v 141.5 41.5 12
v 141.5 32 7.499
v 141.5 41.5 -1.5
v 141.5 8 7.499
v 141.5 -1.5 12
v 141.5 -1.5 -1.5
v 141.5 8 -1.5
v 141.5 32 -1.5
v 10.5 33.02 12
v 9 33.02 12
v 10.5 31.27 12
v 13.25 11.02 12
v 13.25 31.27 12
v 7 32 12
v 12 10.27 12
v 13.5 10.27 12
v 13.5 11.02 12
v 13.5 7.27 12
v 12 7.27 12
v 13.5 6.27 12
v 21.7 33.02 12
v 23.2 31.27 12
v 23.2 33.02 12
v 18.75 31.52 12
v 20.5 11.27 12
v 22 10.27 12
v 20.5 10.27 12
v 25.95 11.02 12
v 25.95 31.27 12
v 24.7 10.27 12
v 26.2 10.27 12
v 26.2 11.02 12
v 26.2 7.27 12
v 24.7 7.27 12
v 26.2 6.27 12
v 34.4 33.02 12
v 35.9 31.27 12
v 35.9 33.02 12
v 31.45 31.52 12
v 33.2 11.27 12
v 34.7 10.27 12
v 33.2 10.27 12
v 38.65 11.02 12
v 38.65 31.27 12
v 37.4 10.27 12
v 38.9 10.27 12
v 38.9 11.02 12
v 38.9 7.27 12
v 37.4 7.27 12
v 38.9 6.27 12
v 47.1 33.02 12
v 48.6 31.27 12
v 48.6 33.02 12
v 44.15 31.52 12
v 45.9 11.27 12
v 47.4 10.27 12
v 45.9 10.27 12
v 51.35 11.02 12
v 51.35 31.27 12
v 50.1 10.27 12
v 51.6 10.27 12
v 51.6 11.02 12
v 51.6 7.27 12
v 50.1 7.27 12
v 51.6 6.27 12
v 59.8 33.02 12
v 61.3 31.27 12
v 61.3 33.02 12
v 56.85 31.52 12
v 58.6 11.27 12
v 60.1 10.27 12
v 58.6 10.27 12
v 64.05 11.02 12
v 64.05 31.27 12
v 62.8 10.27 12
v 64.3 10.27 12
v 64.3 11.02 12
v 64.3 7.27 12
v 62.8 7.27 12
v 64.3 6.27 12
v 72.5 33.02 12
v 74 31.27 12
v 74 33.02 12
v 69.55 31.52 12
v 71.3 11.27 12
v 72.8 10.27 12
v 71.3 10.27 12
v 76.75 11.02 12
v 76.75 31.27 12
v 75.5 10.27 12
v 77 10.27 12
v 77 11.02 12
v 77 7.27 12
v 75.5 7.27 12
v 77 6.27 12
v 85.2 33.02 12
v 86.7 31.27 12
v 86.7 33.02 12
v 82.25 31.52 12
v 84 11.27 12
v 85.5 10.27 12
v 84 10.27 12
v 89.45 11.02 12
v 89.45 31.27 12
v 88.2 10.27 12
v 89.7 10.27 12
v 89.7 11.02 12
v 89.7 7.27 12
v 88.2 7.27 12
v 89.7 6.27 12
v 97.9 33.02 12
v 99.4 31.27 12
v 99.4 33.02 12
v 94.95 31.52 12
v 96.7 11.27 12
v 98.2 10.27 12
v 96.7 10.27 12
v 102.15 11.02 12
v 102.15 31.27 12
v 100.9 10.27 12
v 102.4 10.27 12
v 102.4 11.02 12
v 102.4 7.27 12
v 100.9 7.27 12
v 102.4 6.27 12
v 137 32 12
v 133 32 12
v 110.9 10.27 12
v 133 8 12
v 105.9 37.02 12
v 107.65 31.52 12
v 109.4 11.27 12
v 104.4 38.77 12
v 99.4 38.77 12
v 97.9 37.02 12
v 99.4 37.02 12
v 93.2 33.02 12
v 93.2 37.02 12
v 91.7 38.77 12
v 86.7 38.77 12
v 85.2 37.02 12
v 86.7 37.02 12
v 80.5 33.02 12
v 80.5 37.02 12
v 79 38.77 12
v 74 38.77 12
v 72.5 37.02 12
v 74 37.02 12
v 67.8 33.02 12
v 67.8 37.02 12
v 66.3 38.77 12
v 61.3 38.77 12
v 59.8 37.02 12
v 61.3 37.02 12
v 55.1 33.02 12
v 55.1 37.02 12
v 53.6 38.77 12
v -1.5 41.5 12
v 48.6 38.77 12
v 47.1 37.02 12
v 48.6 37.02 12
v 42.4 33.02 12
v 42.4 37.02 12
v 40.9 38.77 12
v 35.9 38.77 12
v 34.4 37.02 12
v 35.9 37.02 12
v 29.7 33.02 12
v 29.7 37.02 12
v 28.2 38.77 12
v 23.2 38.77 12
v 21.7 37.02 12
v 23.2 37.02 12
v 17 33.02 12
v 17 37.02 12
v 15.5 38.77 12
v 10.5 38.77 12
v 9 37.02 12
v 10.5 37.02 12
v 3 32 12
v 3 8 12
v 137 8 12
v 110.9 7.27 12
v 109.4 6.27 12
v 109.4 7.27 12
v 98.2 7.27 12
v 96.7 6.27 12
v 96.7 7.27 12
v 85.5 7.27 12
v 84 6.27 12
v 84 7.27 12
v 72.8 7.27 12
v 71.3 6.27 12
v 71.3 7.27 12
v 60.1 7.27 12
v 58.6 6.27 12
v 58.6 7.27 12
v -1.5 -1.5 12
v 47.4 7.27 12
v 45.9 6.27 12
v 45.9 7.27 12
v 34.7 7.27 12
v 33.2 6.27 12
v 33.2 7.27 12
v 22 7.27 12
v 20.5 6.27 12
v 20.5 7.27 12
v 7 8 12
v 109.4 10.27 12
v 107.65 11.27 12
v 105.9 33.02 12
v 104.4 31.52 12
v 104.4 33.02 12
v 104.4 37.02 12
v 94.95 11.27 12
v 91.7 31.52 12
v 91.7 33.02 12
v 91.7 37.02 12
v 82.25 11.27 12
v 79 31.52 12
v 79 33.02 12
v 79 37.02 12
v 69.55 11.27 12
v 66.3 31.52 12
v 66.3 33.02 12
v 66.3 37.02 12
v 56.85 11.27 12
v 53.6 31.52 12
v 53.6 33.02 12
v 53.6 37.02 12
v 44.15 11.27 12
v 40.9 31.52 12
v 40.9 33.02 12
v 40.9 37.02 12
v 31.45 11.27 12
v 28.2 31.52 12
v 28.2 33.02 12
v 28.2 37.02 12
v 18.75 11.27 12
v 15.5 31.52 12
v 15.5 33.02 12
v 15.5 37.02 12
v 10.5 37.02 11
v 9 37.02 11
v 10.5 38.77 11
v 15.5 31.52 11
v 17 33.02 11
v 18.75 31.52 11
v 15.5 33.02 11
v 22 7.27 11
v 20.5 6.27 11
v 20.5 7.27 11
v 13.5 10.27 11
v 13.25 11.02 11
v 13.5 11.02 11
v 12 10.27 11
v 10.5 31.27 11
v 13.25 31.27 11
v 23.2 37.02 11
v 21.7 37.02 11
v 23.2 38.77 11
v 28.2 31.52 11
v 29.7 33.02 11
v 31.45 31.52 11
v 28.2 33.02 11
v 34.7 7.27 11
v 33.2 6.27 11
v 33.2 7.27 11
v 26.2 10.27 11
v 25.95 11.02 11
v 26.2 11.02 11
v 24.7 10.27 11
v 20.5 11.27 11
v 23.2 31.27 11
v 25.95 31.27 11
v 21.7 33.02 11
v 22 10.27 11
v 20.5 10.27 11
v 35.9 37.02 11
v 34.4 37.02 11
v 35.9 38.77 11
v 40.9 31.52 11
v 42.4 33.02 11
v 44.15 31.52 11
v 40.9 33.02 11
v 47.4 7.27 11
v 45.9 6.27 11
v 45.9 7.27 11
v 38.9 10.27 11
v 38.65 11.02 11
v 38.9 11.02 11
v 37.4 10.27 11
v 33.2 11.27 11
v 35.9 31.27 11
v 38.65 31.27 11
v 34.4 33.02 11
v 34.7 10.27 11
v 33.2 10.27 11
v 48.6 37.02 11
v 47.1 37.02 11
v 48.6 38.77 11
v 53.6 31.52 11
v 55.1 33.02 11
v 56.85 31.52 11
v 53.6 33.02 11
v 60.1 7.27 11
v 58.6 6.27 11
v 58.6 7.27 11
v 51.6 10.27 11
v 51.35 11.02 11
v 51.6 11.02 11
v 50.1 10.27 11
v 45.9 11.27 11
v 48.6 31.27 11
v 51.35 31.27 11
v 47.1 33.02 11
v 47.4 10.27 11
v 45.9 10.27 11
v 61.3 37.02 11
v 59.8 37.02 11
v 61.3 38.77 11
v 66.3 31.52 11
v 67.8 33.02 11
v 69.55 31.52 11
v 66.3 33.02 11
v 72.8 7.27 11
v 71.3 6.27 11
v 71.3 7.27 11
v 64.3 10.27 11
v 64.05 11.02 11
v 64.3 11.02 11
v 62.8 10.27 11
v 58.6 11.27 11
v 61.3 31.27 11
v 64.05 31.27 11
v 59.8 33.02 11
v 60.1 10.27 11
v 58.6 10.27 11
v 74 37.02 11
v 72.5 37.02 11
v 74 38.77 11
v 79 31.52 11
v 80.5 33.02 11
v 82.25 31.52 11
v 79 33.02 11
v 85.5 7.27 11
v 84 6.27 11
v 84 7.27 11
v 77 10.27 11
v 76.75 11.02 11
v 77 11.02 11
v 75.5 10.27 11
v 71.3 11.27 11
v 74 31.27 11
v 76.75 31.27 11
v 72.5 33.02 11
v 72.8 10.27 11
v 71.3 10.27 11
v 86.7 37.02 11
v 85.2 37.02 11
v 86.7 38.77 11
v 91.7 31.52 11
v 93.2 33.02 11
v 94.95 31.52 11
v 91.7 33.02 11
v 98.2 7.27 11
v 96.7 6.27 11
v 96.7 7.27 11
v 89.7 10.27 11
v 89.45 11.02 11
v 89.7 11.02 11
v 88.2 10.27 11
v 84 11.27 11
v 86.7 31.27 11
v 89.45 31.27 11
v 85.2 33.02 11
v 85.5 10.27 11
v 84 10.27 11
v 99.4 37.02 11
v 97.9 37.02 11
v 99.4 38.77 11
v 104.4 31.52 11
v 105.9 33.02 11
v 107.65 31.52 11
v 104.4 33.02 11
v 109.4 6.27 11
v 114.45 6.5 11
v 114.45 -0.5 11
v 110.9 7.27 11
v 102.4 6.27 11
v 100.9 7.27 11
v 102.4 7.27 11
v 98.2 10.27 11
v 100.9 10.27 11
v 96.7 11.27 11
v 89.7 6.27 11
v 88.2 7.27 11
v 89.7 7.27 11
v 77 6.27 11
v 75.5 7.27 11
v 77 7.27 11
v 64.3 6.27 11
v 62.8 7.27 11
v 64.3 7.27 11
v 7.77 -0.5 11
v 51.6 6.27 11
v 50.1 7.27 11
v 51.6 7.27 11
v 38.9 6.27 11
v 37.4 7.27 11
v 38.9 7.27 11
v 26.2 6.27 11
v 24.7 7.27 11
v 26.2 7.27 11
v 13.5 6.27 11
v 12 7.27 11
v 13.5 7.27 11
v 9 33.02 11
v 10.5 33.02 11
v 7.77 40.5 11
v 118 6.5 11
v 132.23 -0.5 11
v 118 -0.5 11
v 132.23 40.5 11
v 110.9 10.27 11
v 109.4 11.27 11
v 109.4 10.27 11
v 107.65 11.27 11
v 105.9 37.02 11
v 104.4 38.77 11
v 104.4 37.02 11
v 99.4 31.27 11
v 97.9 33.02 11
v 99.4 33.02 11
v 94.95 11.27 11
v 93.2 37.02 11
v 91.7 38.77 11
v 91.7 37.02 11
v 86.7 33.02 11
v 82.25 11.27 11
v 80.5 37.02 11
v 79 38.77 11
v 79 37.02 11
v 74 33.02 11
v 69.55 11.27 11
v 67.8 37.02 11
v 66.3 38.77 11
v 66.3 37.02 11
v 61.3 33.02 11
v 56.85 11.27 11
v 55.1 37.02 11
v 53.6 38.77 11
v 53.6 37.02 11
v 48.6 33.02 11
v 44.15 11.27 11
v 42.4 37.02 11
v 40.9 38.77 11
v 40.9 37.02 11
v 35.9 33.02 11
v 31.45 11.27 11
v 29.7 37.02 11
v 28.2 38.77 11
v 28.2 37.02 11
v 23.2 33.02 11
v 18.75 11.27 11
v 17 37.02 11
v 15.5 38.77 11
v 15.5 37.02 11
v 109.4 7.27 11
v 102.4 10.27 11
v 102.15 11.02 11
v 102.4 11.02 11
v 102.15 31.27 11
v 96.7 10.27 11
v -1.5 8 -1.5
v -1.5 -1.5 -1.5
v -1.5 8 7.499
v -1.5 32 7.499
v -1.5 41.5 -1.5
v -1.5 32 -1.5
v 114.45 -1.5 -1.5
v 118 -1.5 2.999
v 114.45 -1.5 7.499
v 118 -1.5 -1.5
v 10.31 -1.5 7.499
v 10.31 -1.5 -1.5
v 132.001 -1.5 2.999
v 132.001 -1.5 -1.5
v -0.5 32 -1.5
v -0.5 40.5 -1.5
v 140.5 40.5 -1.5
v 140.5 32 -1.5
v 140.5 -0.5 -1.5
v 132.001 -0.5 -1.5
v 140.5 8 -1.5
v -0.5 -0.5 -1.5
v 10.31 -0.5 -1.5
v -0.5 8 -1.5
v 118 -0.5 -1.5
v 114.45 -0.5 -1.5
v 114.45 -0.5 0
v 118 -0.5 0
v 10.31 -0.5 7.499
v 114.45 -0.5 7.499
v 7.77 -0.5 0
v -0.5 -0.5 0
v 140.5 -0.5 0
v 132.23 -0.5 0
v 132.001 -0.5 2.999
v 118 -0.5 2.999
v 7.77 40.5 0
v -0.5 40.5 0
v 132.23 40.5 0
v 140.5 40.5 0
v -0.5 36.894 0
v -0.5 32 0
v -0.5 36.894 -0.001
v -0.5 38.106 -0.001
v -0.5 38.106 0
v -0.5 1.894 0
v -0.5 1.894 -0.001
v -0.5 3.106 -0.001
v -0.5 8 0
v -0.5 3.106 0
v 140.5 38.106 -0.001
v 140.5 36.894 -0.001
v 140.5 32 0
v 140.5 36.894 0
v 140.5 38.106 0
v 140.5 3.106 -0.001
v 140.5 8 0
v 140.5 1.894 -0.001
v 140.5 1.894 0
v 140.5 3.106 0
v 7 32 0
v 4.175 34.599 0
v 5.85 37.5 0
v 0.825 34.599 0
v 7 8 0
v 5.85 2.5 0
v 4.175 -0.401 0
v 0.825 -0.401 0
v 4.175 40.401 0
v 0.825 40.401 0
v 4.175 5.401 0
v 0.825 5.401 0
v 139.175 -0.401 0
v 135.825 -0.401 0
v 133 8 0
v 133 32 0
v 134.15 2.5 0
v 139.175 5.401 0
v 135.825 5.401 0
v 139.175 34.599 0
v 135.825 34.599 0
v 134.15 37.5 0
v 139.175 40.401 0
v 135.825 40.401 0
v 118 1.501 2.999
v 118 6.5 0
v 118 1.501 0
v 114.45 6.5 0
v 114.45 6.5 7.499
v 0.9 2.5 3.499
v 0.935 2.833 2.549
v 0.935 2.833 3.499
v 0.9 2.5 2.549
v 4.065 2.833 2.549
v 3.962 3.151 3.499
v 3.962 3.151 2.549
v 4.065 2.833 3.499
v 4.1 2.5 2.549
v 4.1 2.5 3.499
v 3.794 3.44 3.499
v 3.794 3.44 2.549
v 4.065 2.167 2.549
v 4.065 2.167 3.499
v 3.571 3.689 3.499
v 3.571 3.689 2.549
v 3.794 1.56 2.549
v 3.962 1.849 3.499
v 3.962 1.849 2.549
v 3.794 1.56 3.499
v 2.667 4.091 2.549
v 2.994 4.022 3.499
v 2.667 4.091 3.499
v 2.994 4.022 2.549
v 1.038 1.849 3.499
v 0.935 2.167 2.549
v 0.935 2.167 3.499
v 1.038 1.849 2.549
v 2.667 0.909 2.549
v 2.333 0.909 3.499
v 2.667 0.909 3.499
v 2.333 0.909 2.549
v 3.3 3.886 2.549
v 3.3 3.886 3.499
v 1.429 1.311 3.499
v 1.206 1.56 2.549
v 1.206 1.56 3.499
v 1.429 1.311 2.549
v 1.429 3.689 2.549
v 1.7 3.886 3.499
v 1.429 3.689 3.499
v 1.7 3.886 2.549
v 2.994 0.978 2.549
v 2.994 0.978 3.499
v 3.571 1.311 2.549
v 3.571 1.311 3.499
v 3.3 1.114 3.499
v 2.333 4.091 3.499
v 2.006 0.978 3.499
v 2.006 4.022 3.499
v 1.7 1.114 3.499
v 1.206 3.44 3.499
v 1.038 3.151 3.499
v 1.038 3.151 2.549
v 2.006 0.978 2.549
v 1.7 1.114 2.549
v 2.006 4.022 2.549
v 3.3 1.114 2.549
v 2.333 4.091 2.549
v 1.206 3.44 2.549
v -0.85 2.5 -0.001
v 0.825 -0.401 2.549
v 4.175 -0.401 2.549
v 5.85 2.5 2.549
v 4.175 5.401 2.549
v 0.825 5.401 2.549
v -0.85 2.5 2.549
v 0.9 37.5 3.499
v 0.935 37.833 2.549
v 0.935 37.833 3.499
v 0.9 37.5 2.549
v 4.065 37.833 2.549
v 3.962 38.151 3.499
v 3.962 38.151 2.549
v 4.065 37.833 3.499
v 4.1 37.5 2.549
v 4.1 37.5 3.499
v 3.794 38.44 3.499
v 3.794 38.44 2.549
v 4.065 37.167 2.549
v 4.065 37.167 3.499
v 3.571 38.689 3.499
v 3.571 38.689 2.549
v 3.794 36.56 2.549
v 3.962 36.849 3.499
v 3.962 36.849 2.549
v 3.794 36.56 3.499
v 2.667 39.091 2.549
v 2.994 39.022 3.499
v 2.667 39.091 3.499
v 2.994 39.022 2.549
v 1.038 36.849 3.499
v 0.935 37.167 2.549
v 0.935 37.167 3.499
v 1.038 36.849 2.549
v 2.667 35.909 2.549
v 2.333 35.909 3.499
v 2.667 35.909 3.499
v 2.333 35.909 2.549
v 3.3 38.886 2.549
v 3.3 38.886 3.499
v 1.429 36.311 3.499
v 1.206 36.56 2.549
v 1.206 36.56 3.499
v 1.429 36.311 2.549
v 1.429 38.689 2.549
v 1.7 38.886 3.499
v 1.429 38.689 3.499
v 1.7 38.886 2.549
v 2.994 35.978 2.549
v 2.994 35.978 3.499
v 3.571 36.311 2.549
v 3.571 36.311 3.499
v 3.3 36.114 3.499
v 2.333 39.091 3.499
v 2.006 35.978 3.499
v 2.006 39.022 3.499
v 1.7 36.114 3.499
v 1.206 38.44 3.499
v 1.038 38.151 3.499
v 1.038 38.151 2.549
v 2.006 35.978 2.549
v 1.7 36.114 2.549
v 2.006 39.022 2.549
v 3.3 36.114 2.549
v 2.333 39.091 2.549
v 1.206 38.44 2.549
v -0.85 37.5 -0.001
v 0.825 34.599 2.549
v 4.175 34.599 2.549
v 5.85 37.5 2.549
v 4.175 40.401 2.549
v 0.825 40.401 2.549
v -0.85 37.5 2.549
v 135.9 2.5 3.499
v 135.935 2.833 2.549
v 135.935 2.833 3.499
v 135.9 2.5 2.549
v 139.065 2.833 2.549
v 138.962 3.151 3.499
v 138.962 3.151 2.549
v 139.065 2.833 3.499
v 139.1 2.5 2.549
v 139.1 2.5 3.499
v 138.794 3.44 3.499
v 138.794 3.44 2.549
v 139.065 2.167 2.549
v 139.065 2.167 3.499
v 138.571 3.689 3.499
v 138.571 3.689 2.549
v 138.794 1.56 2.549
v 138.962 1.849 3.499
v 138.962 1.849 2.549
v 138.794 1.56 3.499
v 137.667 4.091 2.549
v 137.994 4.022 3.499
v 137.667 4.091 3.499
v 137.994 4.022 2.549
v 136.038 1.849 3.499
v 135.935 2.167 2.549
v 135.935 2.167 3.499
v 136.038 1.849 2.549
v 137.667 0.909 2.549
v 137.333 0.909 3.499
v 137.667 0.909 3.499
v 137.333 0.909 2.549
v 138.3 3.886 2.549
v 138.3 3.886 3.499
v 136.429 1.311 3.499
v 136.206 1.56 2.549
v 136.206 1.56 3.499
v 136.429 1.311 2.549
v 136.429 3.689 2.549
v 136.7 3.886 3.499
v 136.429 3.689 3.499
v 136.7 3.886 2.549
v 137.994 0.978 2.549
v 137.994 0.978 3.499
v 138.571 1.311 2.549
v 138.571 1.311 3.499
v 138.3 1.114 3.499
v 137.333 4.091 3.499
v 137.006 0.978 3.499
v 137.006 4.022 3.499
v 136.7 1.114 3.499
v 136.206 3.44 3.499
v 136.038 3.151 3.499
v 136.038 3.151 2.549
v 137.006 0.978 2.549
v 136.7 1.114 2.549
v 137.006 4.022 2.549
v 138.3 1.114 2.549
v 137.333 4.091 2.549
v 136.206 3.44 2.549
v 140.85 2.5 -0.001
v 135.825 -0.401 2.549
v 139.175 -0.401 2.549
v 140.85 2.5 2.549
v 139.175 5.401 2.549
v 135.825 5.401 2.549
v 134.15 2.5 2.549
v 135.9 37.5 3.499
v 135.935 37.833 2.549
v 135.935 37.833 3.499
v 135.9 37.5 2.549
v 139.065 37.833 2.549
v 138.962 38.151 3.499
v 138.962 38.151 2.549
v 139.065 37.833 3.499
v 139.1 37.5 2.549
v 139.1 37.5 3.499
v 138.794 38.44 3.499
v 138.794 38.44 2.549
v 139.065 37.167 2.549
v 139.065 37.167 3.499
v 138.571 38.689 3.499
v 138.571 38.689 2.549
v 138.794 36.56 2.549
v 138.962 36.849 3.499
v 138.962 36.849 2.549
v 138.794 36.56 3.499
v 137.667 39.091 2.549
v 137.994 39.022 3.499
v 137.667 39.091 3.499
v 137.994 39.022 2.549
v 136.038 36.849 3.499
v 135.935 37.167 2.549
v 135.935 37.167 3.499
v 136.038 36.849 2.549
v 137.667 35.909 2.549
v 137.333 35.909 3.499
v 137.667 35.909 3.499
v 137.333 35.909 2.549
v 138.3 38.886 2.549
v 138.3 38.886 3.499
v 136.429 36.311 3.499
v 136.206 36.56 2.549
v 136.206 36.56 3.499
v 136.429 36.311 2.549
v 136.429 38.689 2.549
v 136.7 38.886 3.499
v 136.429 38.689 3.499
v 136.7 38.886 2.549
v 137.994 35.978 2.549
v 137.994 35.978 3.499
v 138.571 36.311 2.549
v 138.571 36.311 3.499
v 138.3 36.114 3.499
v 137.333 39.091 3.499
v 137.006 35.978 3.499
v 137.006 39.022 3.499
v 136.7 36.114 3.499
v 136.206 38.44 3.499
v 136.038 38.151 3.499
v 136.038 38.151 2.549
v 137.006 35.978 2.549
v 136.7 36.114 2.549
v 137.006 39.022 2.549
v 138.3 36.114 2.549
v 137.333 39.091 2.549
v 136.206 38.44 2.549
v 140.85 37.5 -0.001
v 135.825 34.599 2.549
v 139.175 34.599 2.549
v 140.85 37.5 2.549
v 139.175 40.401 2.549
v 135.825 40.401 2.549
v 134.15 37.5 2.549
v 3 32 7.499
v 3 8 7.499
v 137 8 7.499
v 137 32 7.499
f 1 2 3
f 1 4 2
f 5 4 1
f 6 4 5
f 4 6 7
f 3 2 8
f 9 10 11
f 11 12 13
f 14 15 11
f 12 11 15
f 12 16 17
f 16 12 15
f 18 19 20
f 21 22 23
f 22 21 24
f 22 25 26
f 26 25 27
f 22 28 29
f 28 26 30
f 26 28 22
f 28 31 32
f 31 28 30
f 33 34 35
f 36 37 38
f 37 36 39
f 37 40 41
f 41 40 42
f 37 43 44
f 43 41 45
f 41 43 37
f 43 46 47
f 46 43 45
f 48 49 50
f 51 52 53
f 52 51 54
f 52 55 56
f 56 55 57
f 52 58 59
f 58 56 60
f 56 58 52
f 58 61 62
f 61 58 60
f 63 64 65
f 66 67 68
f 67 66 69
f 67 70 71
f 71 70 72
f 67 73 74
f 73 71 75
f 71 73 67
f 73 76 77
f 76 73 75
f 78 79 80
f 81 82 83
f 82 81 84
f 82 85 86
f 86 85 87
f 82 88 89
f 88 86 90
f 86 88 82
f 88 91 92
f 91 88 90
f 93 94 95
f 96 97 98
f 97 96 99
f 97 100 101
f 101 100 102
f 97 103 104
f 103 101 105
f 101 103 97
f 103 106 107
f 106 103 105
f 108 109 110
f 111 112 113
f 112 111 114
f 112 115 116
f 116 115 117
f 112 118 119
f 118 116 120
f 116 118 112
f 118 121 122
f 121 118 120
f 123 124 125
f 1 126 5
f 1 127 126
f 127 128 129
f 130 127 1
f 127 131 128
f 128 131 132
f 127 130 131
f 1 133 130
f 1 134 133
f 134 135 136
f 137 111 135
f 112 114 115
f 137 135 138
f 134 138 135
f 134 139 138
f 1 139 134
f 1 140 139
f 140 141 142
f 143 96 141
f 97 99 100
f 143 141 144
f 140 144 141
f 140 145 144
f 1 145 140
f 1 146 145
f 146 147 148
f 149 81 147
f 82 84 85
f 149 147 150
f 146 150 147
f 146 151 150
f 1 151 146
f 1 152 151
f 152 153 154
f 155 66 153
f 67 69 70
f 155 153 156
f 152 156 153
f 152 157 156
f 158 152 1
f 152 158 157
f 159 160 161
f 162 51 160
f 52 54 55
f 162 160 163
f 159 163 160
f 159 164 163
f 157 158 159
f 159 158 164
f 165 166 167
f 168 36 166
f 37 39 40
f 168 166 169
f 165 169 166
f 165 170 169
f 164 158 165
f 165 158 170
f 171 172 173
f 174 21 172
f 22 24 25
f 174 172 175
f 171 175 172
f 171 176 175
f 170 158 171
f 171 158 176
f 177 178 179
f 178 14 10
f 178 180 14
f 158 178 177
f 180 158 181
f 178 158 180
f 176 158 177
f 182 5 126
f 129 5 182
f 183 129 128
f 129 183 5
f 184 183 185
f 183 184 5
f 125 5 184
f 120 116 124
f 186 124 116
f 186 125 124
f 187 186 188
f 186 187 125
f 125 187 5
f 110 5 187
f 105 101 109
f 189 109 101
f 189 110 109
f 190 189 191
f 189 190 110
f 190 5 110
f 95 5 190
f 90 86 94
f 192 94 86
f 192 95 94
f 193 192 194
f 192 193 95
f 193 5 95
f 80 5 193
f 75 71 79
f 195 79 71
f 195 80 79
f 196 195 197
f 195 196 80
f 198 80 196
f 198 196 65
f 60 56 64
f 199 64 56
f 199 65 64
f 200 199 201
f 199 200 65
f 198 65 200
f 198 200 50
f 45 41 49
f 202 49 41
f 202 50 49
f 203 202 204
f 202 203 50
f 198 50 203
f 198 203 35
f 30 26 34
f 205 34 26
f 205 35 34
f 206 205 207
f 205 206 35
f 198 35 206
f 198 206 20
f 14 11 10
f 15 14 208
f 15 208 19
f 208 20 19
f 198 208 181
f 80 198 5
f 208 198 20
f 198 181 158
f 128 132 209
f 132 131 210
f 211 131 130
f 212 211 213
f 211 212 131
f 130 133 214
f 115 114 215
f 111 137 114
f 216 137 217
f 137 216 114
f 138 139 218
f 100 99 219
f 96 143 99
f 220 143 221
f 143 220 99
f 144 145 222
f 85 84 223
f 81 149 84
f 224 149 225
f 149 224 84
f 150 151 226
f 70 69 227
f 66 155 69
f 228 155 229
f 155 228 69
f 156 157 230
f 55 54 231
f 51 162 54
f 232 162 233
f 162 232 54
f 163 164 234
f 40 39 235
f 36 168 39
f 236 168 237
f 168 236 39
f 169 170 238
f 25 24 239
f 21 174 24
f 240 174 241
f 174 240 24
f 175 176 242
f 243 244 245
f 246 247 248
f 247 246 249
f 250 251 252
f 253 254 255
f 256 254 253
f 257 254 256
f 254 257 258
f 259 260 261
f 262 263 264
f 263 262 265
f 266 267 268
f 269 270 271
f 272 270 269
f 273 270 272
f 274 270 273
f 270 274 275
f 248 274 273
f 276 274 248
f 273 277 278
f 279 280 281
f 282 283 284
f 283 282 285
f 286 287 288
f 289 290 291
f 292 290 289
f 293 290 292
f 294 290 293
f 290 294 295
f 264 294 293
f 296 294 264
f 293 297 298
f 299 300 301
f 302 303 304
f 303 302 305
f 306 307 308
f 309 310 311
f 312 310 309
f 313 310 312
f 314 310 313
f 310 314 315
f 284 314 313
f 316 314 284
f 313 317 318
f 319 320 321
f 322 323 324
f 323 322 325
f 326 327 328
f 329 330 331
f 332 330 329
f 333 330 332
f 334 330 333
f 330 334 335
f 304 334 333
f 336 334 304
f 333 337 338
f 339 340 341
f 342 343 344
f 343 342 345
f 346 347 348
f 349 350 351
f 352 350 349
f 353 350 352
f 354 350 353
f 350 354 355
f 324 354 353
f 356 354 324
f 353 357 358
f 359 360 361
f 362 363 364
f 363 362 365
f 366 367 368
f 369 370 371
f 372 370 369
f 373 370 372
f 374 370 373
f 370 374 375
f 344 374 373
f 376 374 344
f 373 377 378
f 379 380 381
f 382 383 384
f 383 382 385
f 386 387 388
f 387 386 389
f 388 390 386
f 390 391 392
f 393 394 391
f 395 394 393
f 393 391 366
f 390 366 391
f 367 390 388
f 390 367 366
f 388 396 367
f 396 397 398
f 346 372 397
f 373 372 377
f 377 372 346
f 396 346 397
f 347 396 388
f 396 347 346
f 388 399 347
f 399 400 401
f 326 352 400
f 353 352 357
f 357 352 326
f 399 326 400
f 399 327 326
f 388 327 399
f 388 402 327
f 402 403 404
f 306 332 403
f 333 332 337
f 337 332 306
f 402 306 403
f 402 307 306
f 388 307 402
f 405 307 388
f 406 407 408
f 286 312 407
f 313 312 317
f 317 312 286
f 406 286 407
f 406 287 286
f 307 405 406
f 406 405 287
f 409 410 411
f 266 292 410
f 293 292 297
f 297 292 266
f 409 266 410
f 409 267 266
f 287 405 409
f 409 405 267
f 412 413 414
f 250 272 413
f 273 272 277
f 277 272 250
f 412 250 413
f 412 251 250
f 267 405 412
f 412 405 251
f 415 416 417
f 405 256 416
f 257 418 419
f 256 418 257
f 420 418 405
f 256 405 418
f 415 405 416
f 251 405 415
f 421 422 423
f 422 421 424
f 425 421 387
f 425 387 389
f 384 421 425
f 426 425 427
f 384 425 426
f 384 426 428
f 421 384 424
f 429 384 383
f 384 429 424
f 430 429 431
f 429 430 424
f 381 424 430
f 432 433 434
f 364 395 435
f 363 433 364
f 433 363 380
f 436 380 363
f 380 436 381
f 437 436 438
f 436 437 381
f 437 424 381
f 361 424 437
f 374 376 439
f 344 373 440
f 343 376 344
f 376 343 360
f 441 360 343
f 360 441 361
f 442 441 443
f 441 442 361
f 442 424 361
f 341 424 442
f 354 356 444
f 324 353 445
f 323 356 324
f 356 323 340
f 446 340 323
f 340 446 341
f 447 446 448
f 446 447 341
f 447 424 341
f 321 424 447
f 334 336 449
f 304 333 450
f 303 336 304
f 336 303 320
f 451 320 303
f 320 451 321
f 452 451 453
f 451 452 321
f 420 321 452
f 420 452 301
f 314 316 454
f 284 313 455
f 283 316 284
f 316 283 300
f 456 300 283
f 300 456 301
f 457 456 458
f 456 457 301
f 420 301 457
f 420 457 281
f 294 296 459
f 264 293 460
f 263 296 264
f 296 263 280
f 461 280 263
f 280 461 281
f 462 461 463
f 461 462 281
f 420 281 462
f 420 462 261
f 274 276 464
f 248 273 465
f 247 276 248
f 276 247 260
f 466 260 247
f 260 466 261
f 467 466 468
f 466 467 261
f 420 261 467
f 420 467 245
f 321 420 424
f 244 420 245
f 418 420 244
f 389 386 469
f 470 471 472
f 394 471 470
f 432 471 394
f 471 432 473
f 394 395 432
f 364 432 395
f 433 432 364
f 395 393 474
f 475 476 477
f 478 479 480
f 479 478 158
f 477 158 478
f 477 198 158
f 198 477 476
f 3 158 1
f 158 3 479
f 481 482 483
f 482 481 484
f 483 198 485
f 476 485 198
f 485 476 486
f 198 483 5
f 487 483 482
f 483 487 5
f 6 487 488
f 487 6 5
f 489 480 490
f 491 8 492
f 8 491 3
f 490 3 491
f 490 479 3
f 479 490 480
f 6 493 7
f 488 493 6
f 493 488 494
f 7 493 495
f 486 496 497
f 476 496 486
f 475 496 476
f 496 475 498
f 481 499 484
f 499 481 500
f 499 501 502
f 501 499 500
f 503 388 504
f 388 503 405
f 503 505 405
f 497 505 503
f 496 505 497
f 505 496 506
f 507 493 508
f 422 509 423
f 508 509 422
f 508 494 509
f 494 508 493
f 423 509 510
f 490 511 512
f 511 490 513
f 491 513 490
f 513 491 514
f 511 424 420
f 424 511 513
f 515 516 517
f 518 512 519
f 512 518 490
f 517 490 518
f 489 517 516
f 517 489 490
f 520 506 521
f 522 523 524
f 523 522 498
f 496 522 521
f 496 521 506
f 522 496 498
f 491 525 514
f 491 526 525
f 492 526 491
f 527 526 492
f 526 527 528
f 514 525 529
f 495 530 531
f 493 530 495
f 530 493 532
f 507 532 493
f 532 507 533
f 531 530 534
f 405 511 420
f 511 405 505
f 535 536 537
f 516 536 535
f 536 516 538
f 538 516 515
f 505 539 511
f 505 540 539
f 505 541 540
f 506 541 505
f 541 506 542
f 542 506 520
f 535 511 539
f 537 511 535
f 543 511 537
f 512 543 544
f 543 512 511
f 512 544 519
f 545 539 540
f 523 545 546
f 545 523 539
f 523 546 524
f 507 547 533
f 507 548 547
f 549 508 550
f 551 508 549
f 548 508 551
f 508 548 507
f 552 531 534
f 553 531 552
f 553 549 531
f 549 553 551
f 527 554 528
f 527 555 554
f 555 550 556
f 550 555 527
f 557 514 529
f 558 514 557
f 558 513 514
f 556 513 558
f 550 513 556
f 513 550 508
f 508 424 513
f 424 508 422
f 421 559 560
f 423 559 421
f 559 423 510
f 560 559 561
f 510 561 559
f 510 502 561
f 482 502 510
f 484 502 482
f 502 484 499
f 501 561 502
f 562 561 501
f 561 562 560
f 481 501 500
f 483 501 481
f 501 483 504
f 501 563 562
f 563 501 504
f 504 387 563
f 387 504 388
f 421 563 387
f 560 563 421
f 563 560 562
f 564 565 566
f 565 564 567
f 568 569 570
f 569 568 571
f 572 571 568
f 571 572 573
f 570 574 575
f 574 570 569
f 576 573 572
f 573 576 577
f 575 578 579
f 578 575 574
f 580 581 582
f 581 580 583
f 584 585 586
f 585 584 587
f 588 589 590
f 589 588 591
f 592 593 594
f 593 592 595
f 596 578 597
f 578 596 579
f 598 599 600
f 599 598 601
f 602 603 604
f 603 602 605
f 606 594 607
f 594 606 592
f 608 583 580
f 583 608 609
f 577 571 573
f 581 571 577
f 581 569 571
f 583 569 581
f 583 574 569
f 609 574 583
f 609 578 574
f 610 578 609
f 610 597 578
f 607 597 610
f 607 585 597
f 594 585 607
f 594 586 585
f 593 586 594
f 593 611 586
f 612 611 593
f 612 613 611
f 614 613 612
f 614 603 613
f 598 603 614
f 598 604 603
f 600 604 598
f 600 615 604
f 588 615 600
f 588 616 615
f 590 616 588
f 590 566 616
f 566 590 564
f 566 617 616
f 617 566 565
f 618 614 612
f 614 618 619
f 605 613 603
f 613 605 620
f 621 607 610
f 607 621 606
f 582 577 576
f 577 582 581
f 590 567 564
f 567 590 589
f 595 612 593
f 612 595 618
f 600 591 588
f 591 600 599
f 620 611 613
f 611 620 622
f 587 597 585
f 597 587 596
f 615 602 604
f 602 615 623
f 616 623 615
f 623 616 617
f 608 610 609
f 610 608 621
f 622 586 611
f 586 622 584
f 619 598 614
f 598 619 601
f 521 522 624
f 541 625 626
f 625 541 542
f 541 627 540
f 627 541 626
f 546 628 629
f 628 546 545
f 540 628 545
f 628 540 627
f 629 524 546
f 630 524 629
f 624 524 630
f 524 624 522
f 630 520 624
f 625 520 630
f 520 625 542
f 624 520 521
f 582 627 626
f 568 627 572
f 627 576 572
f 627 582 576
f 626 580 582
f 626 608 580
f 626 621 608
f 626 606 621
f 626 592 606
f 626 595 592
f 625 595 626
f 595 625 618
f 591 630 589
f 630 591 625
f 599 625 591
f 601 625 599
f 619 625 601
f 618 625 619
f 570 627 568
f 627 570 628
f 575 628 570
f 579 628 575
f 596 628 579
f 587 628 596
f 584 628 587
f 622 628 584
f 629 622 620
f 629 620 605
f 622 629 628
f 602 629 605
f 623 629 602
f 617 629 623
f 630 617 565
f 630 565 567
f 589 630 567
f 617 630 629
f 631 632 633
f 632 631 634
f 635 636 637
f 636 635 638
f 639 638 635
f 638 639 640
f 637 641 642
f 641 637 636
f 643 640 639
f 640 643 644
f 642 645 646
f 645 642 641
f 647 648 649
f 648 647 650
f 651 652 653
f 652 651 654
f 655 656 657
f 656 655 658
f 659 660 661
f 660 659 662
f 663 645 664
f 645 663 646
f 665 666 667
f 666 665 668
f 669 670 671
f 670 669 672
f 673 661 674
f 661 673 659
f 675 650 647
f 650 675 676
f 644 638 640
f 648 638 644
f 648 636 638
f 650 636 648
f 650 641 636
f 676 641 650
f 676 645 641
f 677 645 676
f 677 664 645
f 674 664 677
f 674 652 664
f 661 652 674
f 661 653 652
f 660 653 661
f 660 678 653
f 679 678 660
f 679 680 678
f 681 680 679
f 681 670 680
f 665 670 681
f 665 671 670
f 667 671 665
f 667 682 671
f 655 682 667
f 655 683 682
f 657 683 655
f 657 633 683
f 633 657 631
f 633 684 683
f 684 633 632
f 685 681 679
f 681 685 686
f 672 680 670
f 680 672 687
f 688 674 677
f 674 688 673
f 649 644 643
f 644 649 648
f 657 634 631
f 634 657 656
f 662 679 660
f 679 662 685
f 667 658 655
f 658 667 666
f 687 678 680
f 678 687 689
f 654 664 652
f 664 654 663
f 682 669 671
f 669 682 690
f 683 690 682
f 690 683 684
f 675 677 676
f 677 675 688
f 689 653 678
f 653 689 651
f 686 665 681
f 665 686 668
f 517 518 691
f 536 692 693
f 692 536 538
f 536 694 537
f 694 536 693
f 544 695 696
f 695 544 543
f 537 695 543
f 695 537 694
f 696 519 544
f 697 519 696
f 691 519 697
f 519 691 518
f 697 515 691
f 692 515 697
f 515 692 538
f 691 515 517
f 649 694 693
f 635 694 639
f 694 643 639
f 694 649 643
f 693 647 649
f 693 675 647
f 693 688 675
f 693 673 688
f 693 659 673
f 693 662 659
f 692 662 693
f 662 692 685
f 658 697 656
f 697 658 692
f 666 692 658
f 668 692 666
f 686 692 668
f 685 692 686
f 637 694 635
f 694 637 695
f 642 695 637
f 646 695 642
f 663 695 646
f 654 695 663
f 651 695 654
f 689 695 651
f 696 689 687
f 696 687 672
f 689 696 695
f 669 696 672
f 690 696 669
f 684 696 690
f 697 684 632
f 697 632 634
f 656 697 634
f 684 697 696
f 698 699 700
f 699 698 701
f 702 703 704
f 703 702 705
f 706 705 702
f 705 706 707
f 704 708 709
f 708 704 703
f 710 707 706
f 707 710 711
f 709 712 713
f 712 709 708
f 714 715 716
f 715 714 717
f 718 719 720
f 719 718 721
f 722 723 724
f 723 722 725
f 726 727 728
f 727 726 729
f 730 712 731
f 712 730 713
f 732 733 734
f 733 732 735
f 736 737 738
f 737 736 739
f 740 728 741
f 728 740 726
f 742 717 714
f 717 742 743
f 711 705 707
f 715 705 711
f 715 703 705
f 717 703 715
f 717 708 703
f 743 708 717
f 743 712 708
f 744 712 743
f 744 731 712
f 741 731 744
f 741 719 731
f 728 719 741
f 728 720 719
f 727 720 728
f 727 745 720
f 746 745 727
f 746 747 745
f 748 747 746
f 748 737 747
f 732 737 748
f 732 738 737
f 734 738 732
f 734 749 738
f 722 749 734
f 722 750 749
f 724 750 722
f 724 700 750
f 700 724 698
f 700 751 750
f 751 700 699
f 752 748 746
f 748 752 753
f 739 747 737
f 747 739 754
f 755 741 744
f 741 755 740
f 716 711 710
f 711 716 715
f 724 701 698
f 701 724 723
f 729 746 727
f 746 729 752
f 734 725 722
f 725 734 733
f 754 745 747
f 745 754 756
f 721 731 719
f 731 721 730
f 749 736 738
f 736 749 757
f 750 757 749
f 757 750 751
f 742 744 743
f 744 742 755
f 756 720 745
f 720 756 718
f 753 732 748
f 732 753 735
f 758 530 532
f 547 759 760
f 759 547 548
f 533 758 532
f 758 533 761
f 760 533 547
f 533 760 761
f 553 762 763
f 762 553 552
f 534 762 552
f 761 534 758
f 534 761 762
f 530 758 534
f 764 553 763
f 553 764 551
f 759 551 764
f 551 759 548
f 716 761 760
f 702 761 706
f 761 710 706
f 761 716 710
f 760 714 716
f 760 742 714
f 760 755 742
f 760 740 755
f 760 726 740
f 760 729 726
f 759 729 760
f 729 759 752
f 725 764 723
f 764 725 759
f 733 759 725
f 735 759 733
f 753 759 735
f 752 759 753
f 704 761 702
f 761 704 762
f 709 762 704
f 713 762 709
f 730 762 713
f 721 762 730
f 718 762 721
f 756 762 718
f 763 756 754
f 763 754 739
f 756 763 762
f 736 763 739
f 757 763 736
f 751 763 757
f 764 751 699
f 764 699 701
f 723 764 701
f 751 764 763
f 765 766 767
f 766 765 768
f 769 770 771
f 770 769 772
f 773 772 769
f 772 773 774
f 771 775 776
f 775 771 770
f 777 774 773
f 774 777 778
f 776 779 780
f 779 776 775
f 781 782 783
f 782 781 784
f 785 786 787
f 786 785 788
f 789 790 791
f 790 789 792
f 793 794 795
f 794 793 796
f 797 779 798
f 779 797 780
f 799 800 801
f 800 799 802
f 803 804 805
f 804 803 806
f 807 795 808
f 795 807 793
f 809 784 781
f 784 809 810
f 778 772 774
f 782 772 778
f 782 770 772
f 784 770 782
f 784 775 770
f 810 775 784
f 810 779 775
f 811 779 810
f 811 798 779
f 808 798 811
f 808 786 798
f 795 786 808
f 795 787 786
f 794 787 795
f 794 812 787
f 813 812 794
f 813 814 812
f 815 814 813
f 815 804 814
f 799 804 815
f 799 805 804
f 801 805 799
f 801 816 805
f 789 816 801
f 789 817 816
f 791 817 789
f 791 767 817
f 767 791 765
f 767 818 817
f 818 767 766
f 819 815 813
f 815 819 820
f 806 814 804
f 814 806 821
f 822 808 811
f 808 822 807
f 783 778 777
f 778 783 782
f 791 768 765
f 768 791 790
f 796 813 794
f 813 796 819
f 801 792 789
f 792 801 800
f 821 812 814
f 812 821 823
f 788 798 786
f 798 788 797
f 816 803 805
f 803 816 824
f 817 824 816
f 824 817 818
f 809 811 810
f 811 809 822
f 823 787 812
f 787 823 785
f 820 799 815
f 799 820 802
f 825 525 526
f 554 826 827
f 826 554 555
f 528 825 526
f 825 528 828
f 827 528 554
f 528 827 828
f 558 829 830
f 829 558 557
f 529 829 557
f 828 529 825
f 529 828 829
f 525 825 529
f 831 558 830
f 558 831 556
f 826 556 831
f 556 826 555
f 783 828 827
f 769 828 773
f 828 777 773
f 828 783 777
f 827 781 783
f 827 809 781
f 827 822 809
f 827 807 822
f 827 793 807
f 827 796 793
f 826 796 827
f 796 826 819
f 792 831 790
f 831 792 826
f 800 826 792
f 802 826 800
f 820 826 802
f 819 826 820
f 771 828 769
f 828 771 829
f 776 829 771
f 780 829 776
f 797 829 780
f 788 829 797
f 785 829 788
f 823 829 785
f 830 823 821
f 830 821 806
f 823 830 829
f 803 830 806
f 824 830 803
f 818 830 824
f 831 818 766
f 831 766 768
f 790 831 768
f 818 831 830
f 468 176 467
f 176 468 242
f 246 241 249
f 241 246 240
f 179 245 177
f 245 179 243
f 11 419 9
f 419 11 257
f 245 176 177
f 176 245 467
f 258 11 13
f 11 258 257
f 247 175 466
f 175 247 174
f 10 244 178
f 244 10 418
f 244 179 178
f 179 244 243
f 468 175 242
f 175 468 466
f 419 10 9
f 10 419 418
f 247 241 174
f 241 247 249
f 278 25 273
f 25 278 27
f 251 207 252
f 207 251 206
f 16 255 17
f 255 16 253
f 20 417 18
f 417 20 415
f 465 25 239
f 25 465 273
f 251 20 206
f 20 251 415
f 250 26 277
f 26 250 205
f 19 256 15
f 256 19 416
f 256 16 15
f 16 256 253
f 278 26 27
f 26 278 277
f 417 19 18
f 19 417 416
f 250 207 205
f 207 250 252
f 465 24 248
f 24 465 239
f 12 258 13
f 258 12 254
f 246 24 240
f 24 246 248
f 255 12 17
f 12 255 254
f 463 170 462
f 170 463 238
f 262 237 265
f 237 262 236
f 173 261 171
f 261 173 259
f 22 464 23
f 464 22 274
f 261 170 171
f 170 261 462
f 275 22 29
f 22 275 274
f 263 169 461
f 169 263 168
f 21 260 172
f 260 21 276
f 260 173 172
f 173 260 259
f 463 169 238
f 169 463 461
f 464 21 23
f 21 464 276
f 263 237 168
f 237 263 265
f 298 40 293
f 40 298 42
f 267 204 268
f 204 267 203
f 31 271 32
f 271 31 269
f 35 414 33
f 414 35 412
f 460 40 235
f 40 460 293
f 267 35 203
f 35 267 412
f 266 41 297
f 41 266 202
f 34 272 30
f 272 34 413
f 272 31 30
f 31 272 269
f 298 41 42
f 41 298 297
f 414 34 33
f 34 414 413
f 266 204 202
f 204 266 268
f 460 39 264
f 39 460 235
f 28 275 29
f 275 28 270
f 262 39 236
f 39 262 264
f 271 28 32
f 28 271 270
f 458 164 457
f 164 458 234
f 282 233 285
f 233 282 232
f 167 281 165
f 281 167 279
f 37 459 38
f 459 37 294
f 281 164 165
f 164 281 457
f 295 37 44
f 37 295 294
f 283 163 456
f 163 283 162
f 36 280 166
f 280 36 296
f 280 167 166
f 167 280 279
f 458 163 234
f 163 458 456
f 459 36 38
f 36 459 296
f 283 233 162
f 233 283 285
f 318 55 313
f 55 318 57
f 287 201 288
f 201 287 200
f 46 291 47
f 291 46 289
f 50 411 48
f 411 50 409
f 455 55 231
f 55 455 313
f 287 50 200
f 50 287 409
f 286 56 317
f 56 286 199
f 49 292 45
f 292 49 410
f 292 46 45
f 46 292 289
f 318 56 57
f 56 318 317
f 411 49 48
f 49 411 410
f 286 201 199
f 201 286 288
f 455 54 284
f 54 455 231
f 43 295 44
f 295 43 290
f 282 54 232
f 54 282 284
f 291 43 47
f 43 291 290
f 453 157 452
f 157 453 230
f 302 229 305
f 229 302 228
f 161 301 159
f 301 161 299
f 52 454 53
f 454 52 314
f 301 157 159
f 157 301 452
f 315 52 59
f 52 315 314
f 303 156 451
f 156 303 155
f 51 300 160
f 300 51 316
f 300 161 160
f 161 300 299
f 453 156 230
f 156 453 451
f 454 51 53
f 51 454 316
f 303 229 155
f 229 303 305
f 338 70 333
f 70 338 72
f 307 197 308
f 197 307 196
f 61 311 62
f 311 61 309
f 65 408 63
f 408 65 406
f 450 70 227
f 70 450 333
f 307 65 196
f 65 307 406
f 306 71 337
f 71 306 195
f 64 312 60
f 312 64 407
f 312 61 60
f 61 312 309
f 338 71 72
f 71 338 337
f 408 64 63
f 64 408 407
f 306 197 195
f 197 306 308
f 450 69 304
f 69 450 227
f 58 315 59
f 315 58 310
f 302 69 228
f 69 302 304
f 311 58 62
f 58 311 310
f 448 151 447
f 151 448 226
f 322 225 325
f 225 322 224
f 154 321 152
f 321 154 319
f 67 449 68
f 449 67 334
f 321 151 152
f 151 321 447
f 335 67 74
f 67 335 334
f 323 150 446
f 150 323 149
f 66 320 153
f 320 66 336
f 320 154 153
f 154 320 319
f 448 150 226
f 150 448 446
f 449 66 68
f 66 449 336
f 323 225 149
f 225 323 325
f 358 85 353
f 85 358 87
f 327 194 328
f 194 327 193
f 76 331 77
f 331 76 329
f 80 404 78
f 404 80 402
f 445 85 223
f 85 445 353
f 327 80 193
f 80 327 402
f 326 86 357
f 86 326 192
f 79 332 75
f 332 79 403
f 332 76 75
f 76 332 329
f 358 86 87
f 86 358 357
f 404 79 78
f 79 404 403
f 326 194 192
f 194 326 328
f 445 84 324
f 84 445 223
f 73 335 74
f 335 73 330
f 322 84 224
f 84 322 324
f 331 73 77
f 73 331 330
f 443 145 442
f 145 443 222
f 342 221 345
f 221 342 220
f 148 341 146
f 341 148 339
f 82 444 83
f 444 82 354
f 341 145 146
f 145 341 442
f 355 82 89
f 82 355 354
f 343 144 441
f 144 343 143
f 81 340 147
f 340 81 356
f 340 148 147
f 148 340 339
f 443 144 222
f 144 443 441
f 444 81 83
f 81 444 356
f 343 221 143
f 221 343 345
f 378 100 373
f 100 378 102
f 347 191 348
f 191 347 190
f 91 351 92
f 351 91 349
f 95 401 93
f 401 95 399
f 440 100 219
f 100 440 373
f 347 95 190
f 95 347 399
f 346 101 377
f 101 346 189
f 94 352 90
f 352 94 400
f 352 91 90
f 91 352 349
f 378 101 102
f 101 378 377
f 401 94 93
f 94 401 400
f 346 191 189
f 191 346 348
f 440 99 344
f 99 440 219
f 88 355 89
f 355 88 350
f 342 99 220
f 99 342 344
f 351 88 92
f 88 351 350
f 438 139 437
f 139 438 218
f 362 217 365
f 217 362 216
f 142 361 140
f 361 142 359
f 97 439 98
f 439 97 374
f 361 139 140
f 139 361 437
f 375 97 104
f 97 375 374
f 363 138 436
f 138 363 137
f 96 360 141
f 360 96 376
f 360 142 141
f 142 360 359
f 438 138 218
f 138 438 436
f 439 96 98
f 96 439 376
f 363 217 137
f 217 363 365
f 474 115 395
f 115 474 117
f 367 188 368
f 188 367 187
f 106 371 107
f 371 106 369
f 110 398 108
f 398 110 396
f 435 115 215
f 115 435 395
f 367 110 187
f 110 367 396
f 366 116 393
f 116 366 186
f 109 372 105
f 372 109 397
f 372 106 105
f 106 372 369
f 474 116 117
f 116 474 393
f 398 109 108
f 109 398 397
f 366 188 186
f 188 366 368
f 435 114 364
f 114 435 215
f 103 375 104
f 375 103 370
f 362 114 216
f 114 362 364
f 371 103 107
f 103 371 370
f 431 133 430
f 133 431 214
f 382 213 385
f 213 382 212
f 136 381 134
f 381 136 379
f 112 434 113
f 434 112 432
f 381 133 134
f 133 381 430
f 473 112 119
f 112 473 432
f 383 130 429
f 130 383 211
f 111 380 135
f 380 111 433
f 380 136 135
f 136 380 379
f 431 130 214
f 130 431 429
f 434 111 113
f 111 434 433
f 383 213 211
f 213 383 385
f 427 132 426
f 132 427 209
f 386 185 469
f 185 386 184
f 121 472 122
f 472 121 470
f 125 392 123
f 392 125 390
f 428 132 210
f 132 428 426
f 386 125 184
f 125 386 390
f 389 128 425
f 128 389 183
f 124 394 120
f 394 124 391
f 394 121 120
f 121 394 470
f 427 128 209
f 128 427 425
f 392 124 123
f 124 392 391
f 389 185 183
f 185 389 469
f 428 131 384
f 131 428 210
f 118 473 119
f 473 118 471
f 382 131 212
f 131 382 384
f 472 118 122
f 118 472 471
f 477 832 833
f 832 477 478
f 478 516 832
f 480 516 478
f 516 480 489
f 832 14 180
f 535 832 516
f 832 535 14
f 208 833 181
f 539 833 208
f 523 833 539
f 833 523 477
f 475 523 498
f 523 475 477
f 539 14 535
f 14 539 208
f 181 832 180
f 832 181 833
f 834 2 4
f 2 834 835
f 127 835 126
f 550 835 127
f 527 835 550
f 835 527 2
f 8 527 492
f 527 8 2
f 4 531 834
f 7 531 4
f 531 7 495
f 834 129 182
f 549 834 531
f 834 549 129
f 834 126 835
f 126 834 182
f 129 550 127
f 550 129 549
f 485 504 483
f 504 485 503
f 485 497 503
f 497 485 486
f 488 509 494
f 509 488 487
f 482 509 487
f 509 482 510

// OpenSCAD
//
// ktBOX2s
//
//

A = 1;
B = 0;



gap1 = 0.001;
gap2 = 0.002;
panel_thick = 1;






if( A )
{
//color( "Blue" )
{
difference()
{
    union()
    {
        //wall
        translate( [-1.5, -1.5, 11] )
        cube( [143, 43, panel_thick] );
        translate( [-1.5, -1.5, -1.5] )
        cube( [143, panel_thick, 13.5] );
        translate( [-1.5, 40.5, -1.5] )
        cube( [143, panel_thick, 13.5] );
        translate( [-1.5, -1.5, -1.5] )
        cube( [panel_thick, 43, 13.5] );
        translate( [140.5, -1.5, -1.5] )
        cube( [panel_thick, 43, 13.5] );
        //translate( [109, -1.5+12.8, 0] )
        //cube( [panel_thick, 43-12.8*2, 12] );
        //for(i =[0:7]){
        //    translate( [110-2.54*5*i, 19, 0] )
        //    cube( [panel_thick*2, 4, 12] );
        //}
        
        //side
        translate( [-1.5, -1.5, 0] )
        cube( [9.27, 43, 12] );
        translate( [132.23, -1.5, 0] )
        cube( [9.27, 43, 12] );

        //inter
        //translate( [-1.5+9.27, 2.22+2.54*7+2.54/2-(20+1)/2-panel_thick, 0+1] )
        //cube( [109+1.5-9.27, panel_thick, 12-1] );
        translate( [114.45, -1.5, 0] )
        cube( [3.55, 8, 12] );
    }
    screw_hole( 2.5, 2.5 );
    screw_hole( 2.5, 40-2.5 );
    screw_hole( 140-2.5, 2.5 );
    screw_hole( 140-2.5, 40-2.5 );
    
    //left
    translate( [-1.5-gap1, 8, -1.5-gap1] )
    cube( [8.5, 24, 9] );
    translate( [3, 8, -1.5+gap1] )
    cube( [4, 24, 13.5] );
    
    //right
    translate( [133+gap1, 8, -1.5-gap1] )
    cube( [8.5, 24, 9] );
    translate( [133, 8, -1.5+gap1] )
    cube( [4, 24, 13.5] );
    
    //front
    translate( [2.69+2.54*3, -2, -1.5-gap1] )
    cube( [2.54*41, 11.769, 9] );
    translate( [140-23+1, -1.5-gap1, -1.5-gap1] )
    cube( [14+gap1, 3+gap2, 4.5] );
    
    //relay
    translate( [8.5-1.5+6+6/2, 2.22+2.54*7+2.54/2, 12] ){
        relay_hole( 2.54*5*0, 0 );
        relay_hole( 2.54*5*1, 0 );
        relay_hole( 2.54*5*2, 0 );
        relay_hole( 2.54*5*3, 0 );
        relay_hole( 2.54*5*4, 0 );
        relay_hole( 2.54*5*5, 0 );
        relay_hole( 2.54*5*6, 0 );
        relay_hole( 2.54*5*7, 0 );
    }
}
}
}



if( B )
{
//color( "Black" )
{
    translate( [0, 50, 0] )
    {
        difference()
        {
            union()
            {
                //base
                translate( [-1.5, -1.5, 0] )
                cube( [143, 43, 4] );
            }
            rear_screw_hole( 2.5, 2.5 );
            rear_screw_hole( 2.5, 40-2.5 );
            rear_screw_hole( 140-2.5, 2.5 );
            rear_screw_hole( 140-2.5, 40-2.5 );
            
            //port
            translate( [2.69+2.54*1, 20, 2] )
            cube( [4, 22, 4+gap2], center=true );
            translate( [140-2.69-2.54*1, 20, 2] )
            cube( [4, 22, 4+gap2], center=true );
            
            translate( [2.69-1, 20, 2.5] )
            cube( [4, 22, 3+gap2], center=true );
            translate( [140-2.69+1, 20, 2.5] )
            cube( [4, 22, 3+gap2], center=true );
            
            //all
            translate( [70, 20, 2.5] )
            cube( [123, 40, 3+gap2], center=true );
        }
    }
}
}








module screw_hole( x, y, z=0 )
{
    hole_height = 5-1.5;
    translate( [x, y, z-gap1] )
    {
        cylinder( hole_height, 1.6, 1.6, $fn=30 );
        cylinder( 2.4+0.15, 6.5/2+0.1, 6.5/2+0.1, $fn=6 );
    }
}



module rear_screw_hole( x, y, z=0 )
{
    translate( [x, y, z] )
    {
        translate( [0, 0, 3] )
        cylinder( 5, 1.5, 1.5, $fn=30 );
        translate( [0, 0, 2.2-gap1] )
        cylinder( 0.8+gap2, 1.5+0.7, 1.5, $fn=30 );
        translate( [0, 0, -gap1] )
        cylinder( 2.2+gap1, 3.25+0.4, 3.25-0.6, $fn=30 );
    }
}



module relay_hole( x, y, z=0 )
{
    translate( [x, y, z] )
    {
        cube( [5+0.5, 20+0.5, 3], center=true );
        translate( [-3, (20/2+7/2)+0.5/2, 0] ){
            cube( [5, 7+0.5, 3], center=true );
            cube( [8, 4, 3], center=true );
        }
        translate( [1, -20/2-5/2, 0] ){
            cube( [7, 5, 3], center=true );
            cube( [10, 3, 3], center=true );
        }
    }
}
